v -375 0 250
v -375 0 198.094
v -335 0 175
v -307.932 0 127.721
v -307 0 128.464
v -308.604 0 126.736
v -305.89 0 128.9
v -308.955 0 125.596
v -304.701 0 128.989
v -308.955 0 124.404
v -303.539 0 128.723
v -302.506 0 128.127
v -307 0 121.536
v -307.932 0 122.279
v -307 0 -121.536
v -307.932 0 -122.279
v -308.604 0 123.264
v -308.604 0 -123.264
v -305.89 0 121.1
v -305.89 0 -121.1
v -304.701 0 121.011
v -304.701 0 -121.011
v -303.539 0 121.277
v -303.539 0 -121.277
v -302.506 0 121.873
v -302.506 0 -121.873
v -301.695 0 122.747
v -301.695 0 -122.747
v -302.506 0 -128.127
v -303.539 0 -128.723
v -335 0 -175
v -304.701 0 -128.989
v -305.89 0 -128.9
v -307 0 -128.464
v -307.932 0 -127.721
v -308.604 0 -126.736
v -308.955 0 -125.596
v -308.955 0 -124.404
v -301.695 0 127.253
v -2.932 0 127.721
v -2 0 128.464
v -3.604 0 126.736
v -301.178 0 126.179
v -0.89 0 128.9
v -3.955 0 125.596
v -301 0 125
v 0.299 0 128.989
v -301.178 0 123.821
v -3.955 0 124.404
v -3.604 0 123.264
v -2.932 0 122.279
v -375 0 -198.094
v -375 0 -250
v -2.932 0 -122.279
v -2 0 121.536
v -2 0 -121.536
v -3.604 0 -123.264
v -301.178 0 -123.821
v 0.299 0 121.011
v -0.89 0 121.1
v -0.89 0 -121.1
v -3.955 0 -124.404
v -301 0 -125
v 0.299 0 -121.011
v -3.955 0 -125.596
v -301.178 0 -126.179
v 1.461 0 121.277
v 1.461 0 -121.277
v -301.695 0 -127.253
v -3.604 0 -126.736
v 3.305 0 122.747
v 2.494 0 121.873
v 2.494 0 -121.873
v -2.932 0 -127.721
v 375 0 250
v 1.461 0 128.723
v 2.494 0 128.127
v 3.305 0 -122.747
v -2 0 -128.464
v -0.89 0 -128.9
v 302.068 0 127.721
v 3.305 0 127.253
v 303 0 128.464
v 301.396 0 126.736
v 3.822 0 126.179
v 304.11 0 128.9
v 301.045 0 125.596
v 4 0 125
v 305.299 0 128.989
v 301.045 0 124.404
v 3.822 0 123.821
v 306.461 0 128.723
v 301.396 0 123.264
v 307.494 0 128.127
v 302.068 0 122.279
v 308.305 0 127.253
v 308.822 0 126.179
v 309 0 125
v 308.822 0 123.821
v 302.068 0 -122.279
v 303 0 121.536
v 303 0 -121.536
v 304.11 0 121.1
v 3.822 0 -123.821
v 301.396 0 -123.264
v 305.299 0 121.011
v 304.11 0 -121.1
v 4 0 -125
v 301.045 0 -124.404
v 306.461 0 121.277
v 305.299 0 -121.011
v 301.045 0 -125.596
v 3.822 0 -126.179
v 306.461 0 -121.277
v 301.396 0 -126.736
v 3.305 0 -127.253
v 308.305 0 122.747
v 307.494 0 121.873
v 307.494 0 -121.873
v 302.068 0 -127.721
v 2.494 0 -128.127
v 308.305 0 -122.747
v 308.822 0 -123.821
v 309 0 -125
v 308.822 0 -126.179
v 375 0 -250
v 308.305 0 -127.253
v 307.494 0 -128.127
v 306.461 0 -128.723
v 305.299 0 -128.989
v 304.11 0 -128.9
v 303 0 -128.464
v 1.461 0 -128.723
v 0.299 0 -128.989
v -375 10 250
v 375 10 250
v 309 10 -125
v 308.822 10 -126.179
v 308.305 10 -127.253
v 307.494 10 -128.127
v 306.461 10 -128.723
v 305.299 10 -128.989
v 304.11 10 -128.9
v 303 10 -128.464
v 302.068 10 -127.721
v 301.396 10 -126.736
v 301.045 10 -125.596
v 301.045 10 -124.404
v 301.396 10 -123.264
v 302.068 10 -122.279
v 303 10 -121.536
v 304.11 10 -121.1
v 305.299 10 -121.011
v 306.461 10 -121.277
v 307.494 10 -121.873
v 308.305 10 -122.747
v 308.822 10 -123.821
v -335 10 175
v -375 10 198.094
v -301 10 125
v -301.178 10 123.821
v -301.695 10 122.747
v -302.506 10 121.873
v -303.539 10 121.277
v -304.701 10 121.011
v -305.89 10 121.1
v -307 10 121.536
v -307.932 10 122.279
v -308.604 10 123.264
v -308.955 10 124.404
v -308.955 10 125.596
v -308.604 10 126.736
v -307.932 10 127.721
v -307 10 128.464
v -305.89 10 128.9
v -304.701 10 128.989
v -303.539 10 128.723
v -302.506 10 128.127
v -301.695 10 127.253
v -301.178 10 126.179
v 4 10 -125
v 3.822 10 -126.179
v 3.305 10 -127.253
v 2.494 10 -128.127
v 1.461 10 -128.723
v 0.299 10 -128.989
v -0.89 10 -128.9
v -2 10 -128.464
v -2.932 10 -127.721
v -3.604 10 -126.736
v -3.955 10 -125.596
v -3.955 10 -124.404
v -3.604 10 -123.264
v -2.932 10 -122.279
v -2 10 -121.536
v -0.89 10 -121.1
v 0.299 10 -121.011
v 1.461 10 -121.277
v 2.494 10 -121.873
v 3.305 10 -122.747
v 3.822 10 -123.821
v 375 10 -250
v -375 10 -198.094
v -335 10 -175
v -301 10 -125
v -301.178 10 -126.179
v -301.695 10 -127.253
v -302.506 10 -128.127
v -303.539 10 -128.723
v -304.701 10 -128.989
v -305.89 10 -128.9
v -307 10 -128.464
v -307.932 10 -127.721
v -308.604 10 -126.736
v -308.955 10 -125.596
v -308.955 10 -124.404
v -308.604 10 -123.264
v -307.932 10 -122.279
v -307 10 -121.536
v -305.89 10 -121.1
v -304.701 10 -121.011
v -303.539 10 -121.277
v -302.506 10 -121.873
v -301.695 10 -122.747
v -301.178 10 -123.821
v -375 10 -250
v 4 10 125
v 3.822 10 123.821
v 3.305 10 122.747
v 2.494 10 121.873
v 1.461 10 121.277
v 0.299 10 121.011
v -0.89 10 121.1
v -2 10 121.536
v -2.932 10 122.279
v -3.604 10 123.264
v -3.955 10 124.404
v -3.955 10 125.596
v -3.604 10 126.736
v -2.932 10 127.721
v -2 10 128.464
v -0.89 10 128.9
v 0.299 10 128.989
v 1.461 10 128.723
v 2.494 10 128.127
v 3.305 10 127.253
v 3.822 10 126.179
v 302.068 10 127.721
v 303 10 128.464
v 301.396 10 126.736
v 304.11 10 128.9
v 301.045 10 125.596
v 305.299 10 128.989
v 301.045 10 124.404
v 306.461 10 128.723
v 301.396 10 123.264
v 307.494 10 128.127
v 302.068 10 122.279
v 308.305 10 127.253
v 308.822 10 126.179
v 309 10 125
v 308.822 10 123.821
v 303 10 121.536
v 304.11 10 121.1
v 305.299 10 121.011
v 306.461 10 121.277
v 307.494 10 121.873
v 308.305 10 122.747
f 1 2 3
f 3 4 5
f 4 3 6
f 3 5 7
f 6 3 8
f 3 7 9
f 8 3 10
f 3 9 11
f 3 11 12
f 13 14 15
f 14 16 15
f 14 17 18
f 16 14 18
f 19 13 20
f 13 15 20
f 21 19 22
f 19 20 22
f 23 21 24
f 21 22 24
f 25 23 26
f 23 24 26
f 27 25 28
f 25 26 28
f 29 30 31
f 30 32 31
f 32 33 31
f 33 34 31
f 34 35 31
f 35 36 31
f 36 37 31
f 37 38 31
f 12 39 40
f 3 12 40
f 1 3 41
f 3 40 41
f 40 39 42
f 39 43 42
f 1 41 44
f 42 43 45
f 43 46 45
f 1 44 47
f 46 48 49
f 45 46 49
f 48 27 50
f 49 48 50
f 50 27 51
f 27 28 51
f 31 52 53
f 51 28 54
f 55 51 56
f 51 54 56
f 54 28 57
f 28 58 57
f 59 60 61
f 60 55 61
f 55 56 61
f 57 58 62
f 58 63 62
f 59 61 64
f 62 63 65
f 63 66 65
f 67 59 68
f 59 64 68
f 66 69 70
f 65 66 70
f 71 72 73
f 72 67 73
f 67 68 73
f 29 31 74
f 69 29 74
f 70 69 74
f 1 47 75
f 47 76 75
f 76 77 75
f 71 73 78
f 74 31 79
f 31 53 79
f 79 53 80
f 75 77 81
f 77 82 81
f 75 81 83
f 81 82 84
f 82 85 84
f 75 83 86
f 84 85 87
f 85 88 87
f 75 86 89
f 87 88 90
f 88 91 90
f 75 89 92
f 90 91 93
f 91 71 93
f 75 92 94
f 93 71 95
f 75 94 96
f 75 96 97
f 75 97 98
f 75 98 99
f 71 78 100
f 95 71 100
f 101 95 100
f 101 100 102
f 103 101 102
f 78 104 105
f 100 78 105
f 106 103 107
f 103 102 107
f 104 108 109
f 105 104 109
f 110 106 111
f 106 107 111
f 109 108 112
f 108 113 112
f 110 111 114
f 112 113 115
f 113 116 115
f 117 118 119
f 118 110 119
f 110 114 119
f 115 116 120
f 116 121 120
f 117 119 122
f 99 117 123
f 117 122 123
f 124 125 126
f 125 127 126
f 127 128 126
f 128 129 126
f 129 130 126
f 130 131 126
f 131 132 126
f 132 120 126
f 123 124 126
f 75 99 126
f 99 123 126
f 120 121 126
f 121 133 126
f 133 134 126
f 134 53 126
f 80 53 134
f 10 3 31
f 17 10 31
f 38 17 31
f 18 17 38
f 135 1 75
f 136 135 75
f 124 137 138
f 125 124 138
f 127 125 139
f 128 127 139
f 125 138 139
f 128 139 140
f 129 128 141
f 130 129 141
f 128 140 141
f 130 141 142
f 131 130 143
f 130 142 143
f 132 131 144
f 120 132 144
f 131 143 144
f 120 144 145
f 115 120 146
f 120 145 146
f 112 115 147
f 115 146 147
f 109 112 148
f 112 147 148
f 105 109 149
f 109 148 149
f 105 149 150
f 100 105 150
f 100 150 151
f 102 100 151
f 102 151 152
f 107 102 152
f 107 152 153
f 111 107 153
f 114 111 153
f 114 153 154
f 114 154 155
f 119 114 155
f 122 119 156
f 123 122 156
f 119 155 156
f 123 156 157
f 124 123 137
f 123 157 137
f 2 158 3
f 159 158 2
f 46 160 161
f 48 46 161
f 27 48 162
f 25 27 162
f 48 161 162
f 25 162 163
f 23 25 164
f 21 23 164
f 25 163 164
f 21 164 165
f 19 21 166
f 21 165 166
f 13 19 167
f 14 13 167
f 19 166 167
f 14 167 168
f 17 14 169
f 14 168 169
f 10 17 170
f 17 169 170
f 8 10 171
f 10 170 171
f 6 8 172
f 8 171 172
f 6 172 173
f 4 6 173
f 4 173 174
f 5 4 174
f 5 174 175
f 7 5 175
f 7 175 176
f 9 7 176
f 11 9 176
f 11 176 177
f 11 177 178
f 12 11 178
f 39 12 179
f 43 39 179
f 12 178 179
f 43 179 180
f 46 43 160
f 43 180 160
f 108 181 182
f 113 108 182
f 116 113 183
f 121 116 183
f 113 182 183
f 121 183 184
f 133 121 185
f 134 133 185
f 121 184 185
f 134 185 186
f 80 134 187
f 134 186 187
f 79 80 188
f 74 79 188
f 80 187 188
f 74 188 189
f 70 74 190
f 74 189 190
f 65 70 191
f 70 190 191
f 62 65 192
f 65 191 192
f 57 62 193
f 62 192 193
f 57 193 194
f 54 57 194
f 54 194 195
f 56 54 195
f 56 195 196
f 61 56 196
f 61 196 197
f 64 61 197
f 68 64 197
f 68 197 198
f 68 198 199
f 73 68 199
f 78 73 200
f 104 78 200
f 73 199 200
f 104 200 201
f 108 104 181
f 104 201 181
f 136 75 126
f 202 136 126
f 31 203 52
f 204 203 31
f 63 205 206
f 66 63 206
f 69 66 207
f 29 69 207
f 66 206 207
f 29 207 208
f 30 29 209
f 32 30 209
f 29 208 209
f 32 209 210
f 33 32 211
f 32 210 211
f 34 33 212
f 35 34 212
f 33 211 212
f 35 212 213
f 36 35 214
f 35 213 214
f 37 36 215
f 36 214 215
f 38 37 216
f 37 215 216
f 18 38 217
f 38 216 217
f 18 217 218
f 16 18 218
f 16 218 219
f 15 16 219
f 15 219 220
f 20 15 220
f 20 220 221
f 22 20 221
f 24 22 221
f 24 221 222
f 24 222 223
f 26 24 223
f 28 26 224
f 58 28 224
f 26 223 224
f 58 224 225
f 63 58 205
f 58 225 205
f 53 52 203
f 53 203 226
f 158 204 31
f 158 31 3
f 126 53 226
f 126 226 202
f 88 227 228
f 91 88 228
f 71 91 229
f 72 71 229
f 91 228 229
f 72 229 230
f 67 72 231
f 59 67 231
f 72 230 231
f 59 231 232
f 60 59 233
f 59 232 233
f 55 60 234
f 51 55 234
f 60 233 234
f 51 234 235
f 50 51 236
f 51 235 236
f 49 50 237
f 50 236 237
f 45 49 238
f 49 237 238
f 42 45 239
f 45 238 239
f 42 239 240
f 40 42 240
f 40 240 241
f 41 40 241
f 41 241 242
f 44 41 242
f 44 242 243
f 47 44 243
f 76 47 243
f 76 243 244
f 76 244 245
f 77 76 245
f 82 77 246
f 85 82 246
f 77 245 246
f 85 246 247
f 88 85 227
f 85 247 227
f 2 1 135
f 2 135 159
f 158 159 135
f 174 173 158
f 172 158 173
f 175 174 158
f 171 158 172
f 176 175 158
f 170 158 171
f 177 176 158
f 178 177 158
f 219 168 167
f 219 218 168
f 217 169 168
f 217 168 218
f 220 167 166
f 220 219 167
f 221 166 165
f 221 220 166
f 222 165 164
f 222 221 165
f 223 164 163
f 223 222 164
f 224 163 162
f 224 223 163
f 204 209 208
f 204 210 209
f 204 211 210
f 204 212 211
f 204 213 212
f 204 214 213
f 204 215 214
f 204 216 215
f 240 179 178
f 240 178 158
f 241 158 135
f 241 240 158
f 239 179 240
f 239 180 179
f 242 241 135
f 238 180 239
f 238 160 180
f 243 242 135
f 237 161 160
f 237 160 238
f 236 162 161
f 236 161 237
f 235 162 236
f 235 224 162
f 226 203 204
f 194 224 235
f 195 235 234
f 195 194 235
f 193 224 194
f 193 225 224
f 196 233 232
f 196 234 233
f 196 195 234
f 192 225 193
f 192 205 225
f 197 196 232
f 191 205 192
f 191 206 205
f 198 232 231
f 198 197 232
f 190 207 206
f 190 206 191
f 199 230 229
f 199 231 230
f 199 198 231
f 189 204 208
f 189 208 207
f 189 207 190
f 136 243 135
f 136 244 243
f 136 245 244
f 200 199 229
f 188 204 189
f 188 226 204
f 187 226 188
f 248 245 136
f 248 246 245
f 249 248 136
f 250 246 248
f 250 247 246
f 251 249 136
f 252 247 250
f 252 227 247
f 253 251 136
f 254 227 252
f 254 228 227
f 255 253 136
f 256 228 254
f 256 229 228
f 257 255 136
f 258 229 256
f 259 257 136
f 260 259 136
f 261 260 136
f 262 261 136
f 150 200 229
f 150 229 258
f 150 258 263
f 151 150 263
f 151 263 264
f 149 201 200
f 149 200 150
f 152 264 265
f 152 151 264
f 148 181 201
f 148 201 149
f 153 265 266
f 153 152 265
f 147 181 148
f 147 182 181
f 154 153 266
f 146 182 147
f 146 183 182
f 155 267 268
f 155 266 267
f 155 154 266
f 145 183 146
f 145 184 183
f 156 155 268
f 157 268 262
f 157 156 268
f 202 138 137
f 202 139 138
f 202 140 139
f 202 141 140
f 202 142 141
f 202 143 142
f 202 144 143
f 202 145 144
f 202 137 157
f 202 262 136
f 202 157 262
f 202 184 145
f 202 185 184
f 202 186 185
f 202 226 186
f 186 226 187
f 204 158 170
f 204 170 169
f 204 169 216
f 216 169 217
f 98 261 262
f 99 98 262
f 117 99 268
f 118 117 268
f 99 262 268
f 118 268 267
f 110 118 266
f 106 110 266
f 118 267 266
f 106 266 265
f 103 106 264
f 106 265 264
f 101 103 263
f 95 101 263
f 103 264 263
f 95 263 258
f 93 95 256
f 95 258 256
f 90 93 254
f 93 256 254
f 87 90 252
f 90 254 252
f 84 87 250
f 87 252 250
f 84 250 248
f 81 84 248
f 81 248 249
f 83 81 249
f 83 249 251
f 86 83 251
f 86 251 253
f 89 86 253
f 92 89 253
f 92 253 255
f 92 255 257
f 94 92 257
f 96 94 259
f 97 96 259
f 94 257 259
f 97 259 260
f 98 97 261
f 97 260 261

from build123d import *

# Parameters (mm, degrees)
SKETCH1_W           = 750
SKETCH1_H           = 500
BOSS_EXTRUDE1_DEPTH = 10
SKETCH2_R           = 4
CUT_EXTRUDE1_DEPTH  = 10
SKETCH3_R           = 4
CUT_EXTRUDE2_DEPTH  = 10
SKETCH4_R           = 4
CUT_EXTRUDE3_DEPTH  = 10
SKETCH5_R           = 4
CUT_EXTRUDE4_DEPTH  = 10
SKETCH6_R           = 4
CUT_EXTRUDE5_DEPTH  = 10
SKETCH7_R           = 4
CUT_EXTRUDE6_DEPTH  = 10
CUT_EXTRUDE7_REACH  = 12


with BuildPart() as part:
    # Sketch1 → Boss-Extrude1 (new body)
    with BuildSketch(Plane(origin=(0, 0, 0), x_dir=(1, 0, 0), z_dir=(0, 1, 0))):
        Rectangle(SKETCH1_W, SKETCH1_H)
    extrude(amount=BOSS_EXTRUDE1_DEPTH)

    # Sketch2 → Cut-Extrude1 (cut)
    with BuildSketch(Plane(origin=(0, 10, 0), x_dir=(1, 0, 0), z_dir=(0, 1, 0))):
        with Locations((305, 125)):
            Circle(SKETCH2_R)
    extrude(amount=-CUT_EXTRUDE1_DEPTH, mode=Mode.SUBTRACT)

    # Sketch3 → Cut-Extrude2 (cut)
    with BuildSketch(Plane(origin=(0, 10, 0), x_dir=(1, 0, 0), z_dir=(0, 1, 0))):
        with Locations((305, -125)):
            Circle(SKETCH3_R)
    extrude(amount=-CUT_EXTRUDE2_DEPTH, mode=Mode.SUBTRACT)

    # Sketch4 → Cut-Extrude3 (cut)
    with BuildSketch(Plane(origin=(0, 10, 0), x_dir=(1, 0, 0), z_dir=(0, 1, 0))):
        with Locations((0, 125)):
            Circle(SKETCH4_R)
    extrude(amount=-CUT_EXTRUDE3_DEPTH, mode=Mode.SUBTRACT)

    # Sketch5 → Cut-Extrude4 (cut)
    with BuildSketch(Plane(origin=(0, 10, 0), x_dir=(1, 0, 0), z_dir=(0, 1, 0))):
        with Locations((0, -125)):
            Circle(SKETCH5_R)
    extrude(amount=-CUT_EXTRUDE4_DEPTH, mode=Mode.SUBTRACT)

    # Sketch6 → Cut-Extrude5 (cut)
    with BuildSketch(Plane(origin=(0, 10, 0), x_dir=(1, 0, 0), z_dir=(0, 1, 0))):
        with Locations((-305, 125)):
            Circle(SKETCH6_R)
    extrude(amount=-CUT_EXTRUDE5_DEPTH, mode=Mode.SUBTRACT)

    # Sketch7 → Cut-Extrude6 (cut)
    with BuildSketch(Plane(origin=(0, 10, 0), x_dir=(1, 0, 0), z_dir=(0, 1, 0))):
        with Locations((-305, -125)):
            Circle(SKETCH7_R)
    extrude(amount=-CUT_EXTRUDE6_DEPTH, mode=Mode.SUBTRACT)

    # Sketch10 → Cut-Extrude7 (cut, up to next)
    with BuildSketch(Plane(origin=(0, 10, 0), x_dir=(1, 0, 0), z_dir=(0, 1, 0)), mode=Mode.PRIVATE) as cut_extrude7_sk1:
        Polygon((-335, 175), (-335, -175), (-375, -198.094010768), (-375, 198.094010768), align=None)
    cut_extrude7_tool1 = extrude(cut_extrude7_sk1.sketch, amount=-CUT_EXTRUDE7_REACH, mode=Mode.PRIVATE) & part.part
    add(cut_extrude7_tool1.solids().sort_by_distance((-355.412658, 10, 0))[0], mode=Mode.SUBTRACT)


solid = part.part
